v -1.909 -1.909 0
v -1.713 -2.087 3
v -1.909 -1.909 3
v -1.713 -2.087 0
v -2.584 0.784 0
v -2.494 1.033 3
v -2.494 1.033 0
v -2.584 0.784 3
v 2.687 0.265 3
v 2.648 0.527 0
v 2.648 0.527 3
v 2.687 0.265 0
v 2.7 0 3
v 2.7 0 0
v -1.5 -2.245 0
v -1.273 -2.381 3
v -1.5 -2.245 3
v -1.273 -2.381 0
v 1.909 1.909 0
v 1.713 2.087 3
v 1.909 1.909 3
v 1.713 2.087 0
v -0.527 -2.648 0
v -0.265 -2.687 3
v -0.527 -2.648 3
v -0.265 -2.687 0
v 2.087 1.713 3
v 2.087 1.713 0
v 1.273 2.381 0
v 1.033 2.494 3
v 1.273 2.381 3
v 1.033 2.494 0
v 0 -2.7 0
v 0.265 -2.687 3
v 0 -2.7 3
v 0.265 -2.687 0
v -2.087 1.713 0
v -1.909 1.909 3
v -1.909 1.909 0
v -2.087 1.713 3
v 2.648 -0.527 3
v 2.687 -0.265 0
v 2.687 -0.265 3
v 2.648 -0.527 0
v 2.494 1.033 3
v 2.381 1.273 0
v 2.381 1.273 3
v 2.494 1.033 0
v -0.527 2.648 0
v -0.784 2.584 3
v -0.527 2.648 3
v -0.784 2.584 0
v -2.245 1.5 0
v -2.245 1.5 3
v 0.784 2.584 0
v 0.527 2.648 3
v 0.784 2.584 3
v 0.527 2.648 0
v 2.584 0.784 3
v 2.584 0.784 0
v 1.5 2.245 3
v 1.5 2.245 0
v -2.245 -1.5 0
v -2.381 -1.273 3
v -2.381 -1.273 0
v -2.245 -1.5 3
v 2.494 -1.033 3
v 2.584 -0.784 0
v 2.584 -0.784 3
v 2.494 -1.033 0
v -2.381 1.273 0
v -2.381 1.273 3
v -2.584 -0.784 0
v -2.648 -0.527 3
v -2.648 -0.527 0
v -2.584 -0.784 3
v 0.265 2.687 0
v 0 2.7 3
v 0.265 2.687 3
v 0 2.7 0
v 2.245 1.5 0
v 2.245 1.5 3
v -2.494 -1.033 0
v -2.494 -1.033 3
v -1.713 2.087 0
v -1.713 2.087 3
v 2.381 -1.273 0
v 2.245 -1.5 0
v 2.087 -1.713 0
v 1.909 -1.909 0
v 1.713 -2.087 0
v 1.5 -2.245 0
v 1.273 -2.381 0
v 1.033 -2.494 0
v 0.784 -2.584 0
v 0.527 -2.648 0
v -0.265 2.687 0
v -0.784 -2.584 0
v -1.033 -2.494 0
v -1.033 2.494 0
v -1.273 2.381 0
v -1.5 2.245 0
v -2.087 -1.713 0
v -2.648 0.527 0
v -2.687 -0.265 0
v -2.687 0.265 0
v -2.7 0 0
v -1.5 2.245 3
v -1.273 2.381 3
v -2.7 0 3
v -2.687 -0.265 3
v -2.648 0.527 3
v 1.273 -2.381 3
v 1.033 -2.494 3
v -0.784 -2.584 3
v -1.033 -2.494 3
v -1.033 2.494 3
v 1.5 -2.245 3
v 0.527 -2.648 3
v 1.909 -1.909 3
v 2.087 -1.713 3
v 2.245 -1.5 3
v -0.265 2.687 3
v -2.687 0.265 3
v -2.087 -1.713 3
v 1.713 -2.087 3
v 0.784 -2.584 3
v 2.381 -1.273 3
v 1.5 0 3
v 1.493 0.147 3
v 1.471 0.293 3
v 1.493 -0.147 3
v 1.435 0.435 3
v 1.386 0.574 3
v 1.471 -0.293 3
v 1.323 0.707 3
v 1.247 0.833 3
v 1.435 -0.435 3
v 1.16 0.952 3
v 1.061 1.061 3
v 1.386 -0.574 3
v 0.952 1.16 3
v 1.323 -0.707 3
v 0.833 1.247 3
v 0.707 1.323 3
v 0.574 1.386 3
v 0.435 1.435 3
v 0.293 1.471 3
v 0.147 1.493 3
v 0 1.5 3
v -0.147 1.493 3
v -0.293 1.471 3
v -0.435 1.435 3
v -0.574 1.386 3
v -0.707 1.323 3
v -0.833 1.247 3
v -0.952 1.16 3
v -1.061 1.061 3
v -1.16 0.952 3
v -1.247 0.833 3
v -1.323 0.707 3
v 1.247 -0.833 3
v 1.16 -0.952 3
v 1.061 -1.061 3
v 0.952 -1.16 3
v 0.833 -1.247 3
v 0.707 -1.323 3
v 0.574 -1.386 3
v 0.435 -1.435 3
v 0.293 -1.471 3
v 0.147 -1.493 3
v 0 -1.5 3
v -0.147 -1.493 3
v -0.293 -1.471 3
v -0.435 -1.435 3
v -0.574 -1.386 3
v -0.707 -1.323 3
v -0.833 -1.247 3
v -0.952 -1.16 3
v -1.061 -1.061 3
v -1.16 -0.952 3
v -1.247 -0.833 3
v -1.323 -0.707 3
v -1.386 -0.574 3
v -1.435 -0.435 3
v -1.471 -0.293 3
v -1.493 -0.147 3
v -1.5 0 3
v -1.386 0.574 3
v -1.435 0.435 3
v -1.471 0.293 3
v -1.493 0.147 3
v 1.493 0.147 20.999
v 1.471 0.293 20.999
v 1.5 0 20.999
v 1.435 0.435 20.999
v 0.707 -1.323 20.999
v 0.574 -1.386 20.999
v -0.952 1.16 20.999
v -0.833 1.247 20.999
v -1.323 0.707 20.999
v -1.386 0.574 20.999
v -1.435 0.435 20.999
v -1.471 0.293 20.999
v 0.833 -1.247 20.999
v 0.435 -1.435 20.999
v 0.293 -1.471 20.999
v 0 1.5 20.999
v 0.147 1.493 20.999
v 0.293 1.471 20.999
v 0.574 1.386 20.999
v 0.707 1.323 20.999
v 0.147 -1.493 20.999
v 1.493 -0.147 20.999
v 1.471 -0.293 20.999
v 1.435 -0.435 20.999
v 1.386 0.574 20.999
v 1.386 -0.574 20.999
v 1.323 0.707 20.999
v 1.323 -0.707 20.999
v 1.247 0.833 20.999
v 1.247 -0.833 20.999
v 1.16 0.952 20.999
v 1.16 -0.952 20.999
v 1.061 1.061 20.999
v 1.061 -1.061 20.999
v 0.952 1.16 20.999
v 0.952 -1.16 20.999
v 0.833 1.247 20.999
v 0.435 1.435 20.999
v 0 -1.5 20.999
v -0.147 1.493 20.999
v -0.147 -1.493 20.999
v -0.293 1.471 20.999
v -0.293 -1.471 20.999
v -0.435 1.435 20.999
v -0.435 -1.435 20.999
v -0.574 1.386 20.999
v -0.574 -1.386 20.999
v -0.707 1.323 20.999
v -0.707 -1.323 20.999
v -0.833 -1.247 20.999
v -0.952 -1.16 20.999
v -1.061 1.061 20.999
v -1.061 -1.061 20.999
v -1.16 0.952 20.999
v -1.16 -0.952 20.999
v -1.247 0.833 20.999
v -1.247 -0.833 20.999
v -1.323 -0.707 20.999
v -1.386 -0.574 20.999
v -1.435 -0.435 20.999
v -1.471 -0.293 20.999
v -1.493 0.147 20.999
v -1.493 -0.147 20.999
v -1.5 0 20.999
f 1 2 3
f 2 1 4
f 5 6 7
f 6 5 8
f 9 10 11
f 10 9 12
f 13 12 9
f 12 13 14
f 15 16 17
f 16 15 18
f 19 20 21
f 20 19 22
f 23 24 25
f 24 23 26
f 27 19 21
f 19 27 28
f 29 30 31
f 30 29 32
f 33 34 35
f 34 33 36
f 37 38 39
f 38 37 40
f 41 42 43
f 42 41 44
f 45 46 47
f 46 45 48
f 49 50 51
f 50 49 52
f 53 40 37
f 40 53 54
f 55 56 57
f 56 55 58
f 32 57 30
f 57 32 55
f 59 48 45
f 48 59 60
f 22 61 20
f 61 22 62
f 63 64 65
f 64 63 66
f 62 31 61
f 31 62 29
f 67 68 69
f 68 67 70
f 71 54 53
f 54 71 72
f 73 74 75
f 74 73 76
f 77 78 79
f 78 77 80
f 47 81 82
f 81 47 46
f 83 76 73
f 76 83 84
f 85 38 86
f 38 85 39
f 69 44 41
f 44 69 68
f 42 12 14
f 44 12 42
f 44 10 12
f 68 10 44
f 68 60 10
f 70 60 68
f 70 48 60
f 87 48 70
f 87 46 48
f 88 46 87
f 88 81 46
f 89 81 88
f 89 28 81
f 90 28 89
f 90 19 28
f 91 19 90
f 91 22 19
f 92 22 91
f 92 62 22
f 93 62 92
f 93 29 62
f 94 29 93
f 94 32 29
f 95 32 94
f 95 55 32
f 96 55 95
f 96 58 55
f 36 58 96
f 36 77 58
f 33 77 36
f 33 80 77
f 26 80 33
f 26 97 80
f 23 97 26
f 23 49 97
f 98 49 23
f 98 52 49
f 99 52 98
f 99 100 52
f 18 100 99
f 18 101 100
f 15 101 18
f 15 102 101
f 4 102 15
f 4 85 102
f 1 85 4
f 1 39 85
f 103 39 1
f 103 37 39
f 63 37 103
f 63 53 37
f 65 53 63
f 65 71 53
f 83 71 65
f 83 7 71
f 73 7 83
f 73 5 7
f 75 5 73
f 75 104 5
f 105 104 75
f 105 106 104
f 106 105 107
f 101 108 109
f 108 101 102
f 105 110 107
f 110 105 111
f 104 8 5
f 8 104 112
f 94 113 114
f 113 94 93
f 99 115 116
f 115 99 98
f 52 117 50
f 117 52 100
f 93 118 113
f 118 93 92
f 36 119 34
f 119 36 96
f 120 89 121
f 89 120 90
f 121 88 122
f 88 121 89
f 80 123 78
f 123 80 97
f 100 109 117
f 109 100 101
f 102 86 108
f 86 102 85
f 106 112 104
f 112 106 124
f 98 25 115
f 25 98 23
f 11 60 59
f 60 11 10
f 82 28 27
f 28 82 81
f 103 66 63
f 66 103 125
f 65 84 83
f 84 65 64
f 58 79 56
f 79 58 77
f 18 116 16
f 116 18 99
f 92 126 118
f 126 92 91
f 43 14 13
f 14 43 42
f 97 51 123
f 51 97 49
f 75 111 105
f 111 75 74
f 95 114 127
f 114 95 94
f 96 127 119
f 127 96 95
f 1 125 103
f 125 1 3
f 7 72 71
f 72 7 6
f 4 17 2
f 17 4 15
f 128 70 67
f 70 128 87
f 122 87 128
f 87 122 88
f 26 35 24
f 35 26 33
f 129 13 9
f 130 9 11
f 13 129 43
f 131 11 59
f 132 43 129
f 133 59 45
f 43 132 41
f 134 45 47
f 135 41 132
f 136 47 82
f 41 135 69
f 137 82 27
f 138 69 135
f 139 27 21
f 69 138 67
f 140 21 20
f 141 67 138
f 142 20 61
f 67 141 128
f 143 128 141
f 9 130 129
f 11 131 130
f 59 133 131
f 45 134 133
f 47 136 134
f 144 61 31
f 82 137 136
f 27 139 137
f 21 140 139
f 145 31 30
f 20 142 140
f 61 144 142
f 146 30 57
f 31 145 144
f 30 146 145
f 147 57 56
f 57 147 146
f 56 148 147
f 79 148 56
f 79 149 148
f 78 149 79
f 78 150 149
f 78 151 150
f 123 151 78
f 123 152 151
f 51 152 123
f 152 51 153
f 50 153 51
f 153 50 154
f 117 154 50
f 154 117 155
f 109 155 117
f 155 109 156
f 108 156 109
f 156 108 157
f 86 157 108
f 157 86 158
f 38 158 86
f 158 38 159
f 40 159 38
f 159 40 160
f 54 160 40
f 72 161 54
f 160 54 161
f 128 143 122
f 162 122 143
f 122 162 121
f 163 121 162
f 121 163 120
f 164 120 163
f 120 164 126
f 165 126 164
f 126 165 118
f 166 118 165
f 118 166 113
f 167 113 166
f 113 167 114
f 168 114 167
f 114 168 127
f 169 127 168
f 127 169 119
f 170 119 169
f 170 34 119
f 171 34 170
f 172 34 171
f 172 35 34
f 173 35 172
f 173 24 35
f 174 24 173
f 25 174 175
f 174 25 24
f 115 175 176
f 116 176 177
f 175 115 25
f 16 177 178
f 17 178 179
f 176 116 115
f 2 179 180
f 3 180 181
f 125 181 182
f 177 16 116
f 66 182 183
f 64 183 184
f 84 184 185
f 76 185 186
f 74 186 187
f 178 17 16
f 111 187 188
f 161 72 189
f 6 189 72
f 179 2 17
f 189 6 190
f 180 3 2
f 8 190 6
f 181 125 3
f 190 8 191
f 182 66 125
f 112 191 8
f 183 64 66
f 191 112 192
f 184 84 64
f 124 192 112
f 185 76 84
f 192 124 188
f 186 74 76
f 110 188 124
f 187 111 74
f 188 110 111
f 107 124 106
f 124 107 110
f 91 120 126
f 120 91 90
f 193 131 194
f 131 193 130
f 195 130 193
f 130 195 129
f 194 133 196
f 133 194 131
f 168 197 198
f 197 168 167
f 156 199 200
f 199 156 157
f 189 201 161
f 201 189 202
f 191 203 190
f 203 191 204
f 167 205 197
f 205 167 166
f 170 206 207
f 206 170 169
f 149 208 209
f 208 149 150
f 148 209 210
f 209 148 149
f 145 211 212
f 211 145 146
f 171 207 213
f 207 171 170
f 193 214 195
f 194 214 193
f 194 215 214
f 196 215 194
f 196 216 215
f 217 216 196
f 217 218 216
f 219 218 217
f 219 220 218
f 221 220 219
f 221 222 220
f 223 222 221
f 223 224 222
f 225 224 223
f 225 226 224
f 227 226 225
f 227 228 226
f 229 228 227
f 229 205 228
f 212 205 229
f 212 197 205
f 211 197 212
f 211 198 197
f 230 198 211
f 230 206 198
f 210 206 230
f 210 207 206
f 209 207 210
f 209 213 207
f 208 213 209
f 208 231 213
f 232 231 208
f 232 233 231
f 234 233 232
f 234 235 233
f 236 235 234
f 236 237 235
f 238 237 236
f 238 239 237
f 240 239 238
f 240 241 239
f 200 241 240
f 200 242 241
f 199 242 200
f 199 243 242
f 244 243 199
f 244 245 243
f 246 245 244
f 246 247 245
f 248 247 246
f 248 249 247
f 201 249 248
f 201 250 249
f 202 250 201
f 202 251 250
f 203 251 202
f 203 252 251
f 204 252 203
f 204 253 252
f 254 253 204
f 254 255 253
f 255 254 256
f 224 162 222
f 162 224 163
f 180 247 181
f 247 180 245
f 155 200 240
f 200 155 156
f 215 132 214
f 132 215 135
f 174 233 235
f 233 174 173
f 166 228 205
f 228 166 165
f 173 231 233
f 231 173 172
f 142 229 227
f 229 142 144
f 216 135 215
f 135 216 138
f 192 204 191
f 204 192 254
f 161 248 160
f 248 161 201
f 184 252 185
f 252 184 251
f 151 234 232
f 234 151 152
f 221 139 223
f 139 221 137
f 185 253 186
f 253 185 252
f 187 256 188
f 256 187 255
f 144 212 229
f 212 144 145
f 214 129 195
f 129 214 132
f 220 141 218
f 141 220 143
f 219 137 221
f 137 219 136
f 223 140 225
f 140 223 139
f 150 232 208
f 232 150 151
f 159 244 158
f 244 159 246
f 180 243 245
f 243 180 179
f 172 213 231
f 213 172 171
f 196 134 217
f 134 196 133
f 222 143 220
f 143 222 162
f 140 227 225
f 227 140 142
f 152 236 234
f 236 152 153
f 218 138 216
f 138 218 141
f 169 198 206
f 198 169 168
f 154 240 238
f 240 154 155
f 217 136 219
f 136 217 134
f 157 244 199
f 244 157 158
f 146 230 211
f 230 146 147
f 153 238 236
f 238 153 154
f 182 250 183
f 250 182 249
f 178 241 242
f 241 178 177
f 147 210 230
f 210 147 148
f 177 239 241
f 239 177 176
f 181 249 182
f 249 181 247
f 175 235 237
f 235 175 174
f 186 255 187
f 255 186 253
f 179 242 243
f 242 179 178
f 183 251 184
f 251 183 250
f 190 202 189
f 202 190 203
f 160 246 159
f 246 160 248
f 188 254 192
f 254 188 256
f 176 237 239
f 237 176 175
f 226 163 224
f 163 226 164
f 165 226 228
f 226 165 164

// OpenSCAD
// file: globals.scad
$fn = 64;

// The tolerance of your 3d printer that results in a "tight fit" of two parts.
tolerance = 0.1;

// A small value to be used to offset unions and differences to avoid "z-fighting"
epsilon = 0.001;
// file: shapes.scad
// The xy_ variants of shape modules are centered with respect to the X/Y axes and "sit" on te XY plane.

module xy_cube(width, depth, height) {
    translate([0, 0, height / 2])
    cube([width, depth, height], center=true);
}

module xy_cylinder(
    h,
    r, r1, r2,
    d, d1, d2)
{
    translate([0, 0, h / 2])
    cylinder(h=h, r=r, r1=r1, r2=r2, d=d, d1=d1, d2=d2, center=true);
}

// Spreads out its children, spacing them along the x/y/z axis by the given amount.
module spread(x, y, z) {
    for(i = [0 : $children -1 ]) {
        translate([i*x, i*y, i*z])
        children(i);
    }
}

spread(15, 0, 0) {
    xy_cube(10, 10, 10);
    xy_cylinder(10, d=10);
}
// main file
use <shapes.scad>

include <globals.scad>

// https://www.engineersedge.com/hardware/_metric_socket_head_cap_screws_14054.htm
module xy_cap_bolt(diameter, length) {
    head_diameter = 1.8 * diameter;
	head_height = diameter;
    
    xy_cylinder(d=head_diameter, h=head_height);
    
    translate([0,0,head_height - epsilon])
    xy_cylinder(d=diameter, h=length);
}

xy_cap_bolt(3, 18);
